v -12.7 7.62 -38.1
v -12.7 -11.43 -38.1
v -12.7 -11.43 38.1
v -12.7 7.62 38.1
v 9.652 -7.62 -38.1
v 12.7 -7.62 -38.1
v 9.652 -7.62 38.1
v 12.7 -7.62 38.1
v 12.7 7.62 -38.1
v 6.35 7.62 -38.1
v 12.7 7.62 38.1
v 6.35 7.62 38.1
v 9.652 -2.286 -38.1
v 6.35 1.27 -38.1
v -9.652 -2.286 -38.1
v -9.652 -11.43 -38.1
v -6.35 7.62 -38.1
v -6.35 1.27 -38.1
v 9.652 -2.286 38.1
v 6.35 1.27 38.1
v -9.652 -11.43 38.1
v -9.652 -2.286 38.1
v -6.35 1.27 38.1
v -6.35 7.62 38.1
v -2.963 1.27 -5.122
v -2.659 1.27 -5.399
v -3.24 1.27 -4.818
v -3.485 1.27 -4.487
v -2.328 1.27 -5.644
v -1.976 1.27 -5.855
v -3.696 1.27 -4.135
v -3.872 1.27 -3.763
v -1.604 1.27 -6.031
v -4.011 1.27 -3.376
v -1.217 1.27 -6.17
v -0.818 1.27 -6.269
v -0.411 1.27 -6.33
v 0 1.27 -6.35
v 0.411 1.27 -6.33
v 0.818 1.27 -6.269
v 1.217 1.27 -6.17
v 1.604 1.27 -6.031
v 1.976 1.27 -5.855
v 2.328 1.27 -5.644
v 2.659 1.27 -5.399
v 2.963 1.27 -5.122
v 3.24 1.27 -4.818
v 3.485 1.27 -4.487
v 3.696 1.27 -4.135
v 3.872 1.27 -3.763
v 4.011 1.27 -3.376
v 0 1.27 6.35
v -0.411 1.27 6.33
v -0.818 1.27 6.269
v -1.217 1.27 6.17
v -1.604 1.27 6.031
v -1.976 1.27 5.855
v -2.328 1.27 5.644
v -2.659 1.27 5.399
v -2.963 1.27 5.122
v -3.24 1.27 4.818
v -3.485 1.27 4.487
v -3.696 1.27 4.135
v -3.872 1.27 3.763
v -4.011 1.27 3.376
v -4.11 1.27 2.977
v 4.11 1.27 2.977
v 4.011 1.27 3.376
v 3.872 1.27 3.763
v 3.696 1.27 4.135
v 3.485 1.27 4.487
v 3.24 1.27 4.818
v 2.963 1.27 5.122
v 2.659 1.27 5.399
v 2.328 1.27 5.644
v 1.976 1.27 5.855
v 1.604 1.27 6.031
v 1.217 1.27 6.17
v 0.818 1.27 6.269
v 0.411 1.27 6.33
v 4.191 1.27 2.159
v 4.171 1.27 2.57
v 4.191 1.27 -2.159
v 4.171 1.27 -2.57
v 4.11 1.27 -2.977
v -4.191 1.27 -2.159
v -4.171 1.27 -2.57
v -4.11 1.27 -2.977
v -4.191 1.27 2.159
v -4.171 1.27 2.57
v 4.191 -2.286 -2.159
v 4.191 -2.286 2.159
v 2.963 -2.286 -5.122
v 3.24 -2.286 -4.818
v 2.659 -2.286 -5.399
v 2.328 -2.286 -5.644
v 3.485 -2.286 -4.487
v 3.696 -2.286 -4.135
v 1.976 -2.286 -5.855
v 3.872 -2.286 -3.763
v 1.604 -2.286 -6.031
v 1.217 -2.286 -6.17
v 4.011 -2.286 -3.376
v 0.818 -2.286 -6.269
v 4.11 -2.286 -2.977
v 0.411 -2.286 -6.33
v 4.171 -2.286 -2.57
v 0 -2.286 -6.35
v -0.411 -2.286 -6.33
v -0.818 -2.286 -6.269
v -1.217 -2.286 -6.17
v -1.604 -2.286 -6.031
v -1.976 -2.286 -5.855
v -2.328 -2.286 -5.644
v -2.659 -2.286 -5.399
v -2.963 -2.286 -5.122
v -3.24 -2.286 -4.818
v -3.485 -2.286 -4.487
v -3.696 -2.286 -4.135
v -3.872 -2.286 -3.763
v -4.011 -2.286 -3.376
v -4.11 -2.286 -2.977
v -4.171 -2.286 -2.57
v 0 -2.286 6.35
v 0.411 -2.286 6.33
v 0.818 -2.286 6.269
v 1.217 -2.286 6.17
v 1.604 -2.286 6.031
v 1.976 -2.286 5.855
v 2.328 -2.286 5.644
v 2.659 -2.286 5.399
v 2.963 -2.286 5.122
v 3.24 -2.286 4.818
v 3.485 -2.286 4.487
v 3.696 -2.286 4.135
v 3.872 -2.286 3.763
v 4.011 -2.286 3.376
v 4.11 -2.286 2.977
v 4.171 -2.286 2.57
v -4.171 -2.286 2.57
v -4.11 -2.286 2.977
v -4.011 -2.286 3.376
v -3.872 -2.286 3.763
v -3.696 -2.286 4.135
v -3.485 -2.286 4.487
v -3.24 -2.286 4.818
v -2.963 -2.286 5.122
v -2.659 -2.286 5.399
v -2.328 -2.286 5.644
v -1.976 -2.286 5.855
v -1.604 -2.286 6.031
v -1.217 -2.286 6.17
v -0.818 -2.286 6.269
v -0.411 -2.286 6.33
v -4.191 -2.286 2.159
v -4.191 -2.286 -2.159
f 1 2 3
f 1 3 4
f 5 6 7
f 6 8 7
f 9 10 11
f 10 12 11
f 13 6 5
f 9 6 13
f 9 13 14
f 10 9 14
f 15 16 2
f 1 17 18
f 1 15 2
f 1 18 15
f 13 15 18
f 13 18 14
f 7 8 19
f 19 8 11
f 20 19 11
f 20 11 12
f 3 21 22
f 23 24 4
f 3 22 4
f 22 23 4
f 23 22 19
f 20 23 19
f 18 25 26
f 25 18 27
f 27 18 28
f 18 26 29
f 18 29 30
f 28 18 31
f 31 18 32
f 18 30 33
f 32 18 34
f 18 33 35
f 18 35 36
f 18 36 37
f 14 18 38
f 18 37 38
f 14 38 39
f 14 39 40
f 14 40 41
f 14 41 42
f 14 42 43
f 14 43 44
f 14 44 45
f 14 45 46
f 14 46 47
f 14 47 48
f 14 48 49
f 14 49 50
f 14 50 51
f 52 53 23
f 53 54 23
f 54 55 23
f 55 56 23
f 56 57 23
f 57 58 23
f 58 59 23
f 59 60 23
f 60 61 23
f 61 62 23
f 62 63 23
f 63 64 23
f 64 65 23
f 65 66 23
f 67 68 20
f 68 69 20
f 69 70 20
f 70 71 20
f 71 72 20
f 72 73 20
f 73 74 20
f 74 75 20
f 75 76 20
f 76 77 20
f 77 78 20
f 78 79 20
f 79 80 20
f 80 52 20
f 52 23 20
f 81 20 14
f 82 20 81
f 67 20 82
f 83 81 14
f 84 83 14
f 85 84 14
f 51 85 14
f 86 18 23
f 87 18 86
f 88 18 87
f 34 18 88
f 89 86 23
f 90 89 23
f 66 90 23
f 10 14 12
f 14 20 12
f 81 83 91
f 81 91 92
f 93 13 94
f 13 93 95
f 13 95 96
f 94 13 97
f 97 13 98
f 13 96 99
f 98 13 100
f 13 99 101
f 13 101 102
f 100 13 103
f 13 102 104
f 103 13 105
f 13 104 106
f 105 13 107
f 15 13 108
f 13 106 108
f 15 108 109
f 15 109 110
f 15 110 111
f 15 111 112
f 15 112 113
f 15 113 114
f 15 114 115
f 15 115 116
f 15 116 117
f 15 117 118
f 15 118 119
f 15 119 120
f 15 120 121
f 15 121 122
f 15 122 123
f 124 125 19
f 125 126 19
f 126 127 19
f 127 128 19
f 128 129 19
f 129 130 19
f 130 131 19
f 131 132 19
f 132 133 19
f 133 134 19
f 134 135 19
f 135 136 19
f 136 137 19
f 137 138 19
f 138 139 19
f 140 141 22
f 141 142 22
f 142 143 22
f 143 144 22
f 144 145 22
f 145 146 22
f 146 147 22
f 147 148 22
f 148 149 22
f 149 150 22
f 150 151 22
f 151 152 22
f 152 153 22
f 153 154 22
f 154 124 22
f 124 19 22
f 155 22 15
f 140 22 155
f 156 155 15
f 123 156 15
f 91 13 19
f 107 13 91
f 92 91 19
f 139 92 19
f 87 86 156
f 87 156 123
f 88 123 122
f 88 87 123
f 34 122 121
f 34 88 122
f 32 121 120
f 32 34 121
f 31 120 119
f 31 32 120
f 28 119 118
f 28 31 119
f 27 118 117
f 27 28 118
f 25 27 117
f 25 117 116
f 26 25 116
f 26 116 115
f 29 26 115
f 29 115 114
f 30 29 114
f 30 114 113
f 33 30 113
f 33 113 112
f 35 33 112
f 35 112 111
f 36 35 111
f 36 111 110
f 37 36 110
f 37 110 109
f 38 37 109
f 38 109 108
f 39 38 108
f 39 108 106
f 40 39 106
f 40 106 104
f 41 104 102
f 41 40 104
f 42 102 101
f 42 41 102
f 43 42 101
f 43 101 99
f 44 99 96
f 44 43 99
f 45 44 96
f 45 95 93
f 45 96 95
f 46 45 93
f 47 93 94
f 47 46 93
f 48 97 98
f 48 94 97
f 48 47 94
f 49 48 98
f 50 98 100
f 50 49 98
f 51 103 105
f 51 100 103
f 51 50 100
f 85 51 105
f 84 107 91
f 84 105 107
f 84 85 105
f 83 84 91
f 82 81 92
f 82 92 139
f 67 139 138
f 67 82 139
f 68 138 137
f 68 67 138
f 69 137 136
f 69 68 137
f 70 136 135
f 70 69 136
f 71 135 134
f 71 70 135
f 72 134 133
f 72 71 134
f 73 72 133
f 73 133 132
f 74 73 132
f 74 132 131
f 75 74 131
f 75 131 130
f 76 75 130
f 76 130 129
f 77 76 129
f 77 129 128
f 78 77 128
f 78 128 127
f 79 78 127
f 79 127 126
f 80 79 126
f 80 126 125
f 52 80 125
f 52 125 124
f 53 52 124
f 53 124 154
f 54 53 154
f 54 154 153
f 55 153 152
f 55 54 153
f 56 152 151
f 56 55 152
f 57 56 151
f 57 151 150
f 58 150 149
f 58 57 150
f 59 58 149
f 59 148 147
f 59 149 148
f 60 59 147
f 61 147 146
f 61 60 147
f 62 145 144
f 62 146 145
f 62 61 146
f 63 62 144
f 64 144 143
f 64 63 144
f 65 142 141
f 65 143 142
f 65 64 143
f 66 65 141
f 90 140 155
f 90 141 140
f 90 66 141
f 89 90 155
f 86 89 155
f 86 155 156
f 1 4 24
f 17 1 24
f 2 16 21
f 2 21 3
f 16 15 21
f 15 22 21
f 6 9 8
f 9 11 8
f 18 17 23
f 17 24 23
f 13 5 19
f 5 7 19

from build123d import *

# Parameters (mm, degrees)
BOSS_EXTRUDE1_DEPTH = 38.1
CUT_EXTRUDE1_REACH  = 44.121


with BuildPart() as part:
    # Sketch1 → Boss-Extrude1 (new, symmetric)
    with BuildSketch(Plane.XY):
        Polygon((-12.7, 7.62), (-6.35, 7.62), (-6.35, 1.27), (6.35, 1.27), (6.35, 7.62), (12.7, 7.62), (12.7, -7.62), (9.652, -7.62), (9.652, -2.286), (-9.652, -2.286), (-9.652, -11.43), (-12.7, -11.43), align=None)
    extrude(amount=BOSS_EXTRUDE1_DEPTH, both=True)

    # Sketch2 → Cut-Extrude1 (cut, up to next)
    with BuildSketch(Plane(origin=(0, 1.27, 0), x_dir=(1, 0, 0), z_dir=(0, 1, 0)), mode=Mode.PRIVATE) as cut_extrude1_sk1:
        with BuildLine():
            Line((4.191, 2.159), (4.191, -2.159))
            ThreePointArc((4.191, -2.159), (0, -6.35), (-4.191, -2.159))
            Line((-4.191, -2.159), (-4.191, 2.159))
            ThreePointArc((-4.191, 2.159), (0, 6.35), (4.191, 2.159))
        make_face()
    cut_extrude1_tool1 = extrude(cut_extrude1_sk1.sketch, amount=-CUT_EXTRUDE1_REACH, mode=Mode.PRIVATE) & part.part
    add(cut_extrude1_tool1.solids().sort_by_distance((0, 1.27, 0))[0], mode=Mode.SUBTRACT)


solid = part.part
